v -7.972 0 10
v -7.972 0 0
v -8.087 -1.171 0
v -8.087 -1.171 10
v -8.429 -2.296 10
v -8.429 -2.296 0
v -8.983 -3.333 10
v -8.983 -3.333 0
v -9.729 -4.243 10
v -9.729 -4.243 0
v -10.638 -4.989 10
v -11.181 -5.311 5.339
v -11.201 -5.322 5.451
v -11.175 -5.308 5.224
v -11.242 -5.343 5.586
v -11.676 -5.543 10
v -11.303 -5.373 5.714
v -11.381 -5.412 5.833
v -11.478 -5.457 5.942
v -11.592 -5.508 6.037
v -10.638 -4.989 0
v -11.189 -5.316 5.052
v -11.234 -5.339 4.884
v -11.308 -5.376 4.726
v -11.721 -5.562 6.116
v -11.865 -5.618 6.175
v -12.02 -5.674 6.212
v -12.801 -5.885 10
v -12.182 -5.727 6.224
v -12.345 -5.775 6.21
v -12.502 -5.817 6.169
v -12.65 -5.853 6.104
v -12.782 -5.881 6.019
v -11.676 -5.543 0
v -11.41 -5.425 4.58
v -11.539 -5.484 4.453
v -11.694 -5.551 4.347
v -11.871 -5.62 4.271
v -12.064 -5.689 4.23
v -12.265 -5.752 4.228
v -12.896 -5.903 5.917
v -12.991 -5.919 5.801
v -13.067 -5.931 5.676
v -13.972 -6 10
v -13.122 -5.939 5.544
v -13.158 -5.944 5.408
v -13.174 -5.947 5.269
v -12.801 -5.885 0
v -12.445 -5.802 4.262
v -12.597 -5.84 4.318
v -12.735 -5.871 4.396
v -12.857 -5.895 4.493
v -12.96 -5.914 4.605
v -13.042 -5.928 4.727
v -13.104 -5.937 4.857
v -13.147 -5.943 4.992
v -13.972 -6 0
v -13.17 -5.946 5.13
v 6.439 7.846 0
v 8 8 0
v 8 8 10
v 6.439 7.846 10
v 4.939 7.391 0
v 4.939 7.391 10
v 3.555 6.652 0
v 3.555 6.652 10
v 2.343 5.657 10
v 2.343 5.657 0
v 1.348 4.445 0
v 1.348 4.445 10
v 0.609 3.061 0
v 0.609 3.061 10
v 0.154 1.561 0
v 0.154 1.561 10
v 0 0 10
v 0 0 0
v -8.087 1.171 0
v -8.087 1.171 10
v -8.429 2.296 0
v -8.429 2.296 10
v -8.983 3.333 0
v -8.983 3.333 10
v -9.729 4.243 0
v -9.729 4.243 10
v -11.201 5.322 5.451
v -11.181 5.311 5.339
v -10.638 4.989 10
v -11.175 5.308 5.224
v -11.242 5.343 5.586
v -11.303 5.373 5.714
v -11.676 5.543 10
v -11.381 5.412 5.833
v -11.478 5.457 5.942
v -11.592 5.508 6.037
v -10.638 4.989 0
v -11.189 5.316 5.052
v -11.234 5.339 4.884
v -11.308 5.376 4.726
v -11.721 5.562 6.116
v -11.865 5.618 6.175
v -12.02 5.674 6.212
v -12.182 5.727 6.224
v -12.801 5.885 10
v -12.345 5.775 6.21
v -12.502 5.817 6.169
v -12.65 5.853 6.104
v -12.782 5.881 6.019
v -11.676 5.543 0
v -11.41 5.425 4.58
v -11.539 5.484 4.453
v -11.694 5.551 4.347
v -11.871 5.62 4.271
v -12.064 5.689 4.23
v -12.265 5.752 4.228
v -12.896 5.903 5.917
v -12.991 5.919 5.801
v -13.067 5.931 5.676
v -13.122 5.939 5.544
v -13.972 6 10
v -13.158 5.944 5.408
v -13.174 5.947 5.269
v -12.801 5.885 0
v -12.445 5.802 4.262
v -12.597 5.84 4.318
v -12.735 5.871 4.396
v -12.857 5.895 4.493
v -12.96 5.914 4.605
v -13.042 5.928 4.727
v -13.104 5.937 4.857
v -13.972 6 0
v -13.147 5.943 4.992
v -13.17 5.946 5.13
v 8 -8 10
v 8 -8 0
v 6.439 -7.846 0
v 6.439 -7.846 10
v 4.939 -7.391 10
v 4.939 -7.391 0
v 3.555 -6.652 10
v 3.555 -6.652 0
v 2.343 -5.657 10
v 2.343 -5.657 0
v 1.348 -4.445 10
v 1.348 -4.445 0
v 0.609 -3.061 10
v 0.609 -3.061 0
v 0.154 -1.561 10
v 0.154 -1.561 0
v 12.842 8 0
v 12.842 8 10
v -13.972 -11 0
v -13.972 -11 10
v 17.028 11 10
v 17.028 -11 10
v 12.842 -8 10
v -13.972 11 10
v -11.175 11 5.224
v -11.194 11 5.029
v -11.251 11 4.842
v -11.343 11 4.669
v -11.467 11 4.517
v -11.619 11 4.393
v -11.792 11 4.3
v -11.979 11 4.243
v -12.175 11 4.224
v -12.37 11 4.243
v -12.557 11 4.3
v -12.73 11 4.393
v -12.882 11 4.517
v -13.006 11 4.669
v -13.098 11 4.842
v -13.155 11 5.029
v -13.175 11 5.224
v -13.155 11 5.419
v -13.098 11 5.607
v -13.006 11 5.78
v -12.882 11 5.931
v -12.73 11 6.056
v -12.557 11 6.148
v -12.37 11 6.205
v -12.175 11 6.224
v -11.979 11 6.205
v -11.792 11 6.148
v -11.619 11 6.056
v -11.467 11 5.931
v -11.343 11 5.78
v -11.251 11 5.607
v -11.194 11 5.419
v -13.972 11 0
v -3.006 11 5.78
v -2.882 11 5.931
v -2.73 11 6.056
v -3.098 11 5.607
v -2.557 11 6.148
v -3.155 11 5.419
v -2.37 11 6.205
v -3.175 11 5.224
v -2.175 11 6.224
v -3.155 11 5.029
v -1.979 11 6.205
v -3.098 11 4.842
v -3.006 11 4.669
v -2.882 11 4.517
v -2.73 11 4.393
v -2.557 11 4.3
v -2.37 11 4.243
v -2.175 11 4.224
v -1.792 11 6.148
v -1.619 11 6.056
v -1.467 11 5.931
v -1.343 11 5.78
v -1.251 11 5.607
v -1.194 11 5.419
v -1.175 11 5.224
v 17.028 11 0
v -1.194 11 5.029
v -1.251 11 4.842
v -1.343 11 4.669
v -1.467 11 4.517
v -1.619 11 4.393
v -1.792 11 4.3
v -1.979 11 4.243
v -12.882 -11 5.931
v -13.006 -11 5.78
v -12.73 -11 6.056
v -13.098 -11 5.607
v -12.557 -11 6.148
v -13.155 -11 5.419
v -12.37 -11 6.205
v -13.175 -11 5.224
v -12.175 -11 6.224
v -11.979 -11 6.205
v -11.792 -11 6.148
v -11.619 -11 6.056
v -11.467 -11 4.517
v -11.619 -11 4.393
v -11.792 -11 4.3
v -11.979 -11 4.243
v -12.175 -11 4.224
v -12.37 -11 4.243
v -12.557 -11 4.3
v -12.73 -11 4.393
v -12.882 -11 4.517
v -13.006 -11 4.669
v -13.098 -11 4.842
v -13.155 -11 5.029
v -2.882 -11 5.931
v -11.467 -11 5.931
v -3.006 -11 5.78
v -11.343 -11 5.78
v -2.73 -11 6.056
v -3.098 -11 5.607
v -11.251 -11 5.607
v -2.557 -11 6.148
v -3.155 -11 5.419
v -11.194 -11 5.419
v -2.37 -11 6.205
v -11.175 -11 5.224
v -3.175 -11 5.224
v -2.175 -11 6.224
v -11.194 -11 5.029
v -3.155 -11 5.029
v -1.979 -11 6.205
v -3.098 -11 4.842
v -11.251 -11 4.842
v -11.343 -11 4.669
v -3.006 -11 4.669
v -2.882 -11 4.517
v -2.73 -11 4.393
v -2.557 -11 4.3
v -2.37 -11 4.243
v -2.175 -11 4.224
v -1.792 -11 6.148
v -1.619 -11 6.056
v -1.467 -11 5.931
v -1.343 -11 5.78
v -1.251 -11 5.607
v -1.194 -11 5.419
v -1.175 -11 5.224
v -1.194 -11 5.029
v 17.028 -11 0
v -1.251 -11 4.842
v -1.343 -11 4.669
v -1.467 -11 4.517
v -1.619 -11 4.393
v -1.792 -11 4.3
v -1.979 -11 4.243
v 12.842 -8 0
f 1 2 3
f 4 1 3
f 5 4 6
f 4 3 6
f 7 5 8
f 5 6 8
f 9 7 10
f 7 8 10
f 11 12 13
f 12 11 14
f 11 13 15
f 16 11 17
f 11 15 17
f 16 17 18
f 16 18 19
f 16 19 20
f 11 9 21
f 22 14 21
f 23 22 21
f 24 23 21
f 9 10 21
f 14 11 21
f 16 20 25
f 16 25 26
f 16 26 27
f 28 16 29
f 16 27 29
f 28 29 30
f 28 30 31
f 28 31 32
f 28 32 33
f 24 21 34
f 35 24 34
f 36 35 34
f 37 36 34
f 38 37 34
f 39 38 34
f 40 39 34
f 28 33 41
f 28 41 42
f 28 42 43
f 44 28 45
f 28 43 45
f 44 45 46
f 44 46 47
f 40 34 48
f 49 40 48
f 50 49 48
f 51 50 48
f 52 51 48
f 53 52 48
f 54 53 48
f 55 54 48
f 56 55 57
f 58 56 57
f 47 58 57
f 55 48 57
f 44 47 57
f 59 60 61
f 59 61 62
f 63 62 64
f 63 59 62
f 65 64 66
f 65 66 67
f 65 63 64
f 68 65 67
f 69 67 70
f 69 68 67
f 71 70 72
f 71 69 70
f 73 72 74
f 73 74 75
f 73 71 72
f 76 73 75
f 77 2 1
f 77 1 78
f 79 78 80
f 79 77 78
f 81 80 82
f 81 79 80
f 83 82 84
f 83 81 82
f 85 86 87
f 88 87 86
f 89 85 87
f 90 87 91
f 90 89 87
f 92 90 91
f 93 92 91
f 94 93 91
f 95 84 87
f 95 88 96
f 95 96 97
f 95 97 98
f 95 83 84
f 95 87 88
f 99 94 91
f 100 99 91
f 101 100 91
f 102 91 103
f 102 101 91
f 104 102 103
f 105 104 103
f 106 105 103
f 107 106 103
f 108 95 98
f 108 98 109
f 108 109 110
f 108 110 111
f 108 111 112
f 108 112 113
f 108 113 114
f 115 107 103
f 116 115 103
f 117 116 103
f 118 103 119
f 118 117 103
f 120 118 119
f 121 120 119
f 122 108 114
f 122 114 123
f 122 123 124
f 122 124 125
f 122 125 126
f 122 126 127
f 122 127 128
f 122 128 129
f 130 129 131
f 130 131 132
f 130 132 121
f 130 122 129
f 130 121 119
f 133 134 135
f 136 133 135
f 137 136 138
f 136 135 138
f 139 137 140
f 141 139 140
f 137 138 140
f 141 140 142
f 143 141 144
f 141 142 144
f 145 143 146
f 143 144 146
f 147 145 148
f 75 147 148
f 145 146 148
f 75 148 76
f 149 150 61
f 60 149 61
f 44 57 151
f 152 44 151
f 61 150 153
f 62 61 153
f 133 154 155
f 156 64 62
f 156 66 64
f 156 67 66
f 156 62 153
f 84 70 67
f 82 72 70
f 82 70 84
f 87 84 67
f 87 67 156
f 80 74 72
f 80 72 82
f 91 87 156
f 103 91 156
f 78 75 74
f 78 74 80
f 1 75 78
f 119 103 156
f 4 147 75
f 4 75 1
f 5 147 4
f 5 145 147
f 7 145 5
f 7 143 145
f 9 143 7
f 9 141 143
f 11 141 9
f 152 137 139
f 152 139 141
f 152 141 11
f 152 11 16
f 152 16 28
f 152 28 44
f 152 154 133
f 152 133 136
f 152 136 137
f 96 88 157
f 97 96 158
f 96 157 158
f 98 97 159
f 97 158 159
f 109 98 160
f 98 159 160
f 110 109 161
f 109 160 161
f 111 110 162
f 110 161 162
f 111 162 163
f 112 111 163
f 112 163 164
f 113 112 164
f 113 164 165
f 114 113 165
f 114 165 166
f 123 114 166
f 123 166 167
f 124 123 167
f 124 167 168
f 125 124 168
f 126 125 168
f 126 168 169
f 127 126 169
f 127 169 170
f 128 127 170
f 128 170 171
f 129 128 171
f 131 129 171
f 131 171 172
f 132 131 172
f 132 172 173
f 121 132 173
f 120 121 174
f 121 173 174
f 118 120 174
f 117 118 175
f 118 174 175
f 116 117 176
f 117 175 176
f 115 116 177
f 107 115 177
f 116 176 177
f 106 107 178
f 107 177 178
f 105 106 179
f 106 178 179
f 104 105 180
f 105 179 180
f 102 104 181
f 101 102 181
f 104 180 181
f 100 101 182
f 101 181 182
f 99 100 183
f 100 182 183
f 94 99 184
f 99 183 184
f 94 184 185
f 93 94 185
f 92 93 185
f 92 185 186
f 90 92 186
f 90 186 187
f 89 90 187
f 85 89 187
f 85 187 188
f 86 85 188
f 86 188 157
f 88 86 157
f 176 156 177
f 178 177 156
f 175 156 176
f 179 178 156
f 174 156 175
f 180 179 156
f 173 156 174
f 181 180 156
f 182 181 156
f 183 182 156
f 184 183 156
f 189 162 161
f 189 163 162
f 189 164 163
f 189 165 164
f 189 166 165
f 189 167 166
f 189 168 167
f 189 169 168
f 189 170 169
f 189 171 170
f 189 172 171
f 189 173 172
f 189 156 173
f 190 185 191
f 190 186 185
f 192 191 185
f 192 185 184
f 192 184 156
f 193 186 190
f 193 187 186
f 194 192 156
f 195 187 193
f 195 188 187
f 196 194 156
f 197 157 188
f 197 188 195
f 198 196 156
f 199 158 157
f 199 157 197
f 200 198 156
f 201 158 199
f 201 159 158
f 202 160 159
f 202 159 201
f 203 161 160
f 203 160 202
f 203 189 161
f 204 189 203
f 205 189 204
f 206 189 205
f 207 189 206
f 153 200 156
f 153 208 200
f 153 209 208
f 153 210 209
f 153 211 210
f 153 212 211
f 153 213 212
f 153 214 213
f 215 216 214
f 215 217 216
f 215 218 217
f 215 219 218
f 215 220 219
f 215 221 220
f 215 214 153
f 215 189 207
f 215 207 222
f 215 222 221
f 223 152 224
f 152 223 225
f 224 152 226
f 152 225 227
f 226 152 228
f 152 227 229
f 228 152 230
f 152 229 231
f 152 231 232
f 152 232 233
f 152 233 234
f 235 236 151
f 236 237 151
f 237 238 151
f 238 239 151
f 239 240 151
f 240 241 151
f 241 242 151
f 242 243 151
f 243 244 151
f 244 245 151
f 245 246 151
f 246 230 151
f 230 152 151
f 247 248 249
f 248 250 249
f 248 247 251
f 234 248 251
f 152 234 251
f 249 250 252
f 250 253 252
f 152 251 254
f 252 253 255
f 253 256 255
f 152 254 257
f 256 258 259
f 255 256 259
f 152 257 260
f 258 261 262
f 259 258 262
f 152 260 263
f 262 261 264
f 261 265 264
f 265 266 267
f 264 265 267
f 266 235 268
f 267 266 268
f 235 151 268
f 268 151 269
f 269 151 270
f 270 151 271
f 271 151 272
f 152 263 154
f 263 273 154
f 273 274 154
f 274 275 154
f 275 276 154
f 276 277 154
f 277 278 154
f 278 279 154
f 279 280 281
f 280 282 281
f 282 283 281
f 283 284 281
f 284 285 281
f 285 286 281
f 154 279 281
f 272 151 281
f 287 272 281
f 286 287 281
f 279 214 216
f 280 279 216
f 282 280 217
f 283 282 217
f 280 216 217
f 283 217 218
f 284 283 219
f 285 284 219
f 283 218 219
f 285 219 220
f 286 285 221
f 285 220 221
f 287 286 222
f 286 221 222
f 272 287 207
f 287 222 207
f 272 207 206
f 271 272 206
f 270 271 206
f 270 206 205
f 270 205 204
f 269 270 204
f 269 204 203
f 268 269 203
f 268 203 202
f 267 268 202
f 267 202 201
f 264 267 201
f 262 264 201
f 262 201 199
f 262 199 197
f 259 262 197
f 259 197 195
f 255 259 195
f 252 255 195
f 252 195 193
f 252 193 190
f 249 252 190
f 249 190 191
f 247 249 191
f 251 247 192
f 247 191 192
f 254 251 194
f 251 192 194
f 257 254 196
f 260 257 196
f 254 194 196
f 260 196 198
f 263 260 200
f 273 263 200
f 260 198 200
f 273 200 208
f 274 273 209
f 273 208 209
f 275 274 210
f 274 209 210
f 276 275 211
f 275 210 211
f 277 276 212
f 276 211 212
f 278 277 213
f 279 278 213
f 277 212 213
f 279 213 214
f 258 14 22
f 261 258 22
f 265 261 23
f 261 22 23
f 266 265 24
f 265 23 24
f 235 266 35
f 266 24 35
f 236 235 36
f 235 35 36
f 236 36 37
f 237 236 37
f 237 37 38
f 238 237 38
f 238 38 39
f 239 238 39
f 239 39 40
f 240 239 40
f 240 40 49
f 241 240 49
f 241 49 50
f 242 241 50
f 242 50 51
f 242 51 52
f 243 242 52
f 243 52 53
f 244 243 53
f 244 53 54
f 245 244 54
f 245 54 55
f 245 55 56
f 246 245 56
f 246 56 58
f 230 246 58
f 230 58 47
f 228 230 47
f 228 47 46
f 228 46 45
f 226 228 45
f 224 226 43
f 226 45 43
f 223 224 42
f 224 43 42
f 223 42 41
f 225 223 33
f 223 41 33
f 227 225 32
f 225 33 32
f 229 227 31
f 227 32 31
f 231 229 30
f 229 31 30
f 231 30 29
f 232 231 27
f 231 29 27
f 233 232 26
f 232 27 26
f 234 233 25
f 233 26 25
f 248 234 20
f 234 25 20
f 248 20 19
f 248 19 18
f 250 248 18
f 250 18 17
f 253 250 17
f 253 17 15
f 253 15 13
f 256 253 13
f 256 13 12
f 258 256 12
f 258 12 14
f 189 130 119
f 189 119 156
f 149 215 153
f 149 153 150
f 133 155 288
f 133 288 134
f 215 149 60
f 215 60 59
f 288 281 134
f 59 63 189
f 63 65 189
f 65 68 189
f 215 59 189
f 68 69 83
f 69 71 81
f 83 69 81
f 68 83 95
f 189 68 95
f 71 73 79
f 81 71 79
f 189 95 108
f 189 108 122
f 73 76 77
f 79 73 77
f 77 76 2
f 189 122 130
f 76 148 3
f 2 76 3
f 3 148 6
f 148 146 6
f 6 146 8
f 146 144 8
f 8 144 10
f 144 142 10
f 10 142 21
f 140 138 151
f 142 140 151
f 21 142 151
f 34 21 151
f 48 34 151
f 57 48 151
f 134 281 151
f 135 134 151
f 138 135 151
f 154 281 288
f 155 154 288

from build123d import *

# Parameters (mm, degrees)
BOSS_EXTRUDE1_DEPTH = 10
SKETCH2_R           = 1
CUT_EXTRUDE1_DEPTH  = 23


with BuildPart() as part:
    # Sketch1 → Boss-Extrude1 (new body)
    with BuildSketch(Plane.XY):
        with BuildLine():
            Line((-13.971915032, 11), (17.028084968, 11))
            Line((17.028084968, 11), (12.841878076, 8))
            Line((12.841878076, 8), (8, 8))
            ThreePointArc((8, 8), (2.343145751, 5.656854249), (0, 0))
            Line((0, 0), (-7.971915032, 0))
            ThreePointArc((-7.971915032, 0), (-9.729274345, 4.242640687), (-13.971915032, 6))
            Line((-13.971915032, 6), (-13.971915032, 11))
        make_face()
    boss_extrude1 = extrude(amount=BOSS_EXTRUDE1_DEPTH)

    # Mirror1: Boss-Extrude1 across plane
    add(boss_extrude1.mirror(Plane.ZX))

    # Sketch2 → Cut-Extrude1 (cut, through all)
    with BuildSketch(Plane(origin=(0, 11, 0), x_dir=(1, 0, 0), z_dir=(0, 1, 0))):
        with Locations((-12.174520537, -5.224275734)):
            Circle(SKETCH2_R)
        with Locations((-2.174520537, -5.224275734)):
            Circle(SKETCH2_R)
    extrude(amount=-CUT_EXTRUDE1_DEPTH, mode=Mode.SUBTRACT)


solid = part.part
